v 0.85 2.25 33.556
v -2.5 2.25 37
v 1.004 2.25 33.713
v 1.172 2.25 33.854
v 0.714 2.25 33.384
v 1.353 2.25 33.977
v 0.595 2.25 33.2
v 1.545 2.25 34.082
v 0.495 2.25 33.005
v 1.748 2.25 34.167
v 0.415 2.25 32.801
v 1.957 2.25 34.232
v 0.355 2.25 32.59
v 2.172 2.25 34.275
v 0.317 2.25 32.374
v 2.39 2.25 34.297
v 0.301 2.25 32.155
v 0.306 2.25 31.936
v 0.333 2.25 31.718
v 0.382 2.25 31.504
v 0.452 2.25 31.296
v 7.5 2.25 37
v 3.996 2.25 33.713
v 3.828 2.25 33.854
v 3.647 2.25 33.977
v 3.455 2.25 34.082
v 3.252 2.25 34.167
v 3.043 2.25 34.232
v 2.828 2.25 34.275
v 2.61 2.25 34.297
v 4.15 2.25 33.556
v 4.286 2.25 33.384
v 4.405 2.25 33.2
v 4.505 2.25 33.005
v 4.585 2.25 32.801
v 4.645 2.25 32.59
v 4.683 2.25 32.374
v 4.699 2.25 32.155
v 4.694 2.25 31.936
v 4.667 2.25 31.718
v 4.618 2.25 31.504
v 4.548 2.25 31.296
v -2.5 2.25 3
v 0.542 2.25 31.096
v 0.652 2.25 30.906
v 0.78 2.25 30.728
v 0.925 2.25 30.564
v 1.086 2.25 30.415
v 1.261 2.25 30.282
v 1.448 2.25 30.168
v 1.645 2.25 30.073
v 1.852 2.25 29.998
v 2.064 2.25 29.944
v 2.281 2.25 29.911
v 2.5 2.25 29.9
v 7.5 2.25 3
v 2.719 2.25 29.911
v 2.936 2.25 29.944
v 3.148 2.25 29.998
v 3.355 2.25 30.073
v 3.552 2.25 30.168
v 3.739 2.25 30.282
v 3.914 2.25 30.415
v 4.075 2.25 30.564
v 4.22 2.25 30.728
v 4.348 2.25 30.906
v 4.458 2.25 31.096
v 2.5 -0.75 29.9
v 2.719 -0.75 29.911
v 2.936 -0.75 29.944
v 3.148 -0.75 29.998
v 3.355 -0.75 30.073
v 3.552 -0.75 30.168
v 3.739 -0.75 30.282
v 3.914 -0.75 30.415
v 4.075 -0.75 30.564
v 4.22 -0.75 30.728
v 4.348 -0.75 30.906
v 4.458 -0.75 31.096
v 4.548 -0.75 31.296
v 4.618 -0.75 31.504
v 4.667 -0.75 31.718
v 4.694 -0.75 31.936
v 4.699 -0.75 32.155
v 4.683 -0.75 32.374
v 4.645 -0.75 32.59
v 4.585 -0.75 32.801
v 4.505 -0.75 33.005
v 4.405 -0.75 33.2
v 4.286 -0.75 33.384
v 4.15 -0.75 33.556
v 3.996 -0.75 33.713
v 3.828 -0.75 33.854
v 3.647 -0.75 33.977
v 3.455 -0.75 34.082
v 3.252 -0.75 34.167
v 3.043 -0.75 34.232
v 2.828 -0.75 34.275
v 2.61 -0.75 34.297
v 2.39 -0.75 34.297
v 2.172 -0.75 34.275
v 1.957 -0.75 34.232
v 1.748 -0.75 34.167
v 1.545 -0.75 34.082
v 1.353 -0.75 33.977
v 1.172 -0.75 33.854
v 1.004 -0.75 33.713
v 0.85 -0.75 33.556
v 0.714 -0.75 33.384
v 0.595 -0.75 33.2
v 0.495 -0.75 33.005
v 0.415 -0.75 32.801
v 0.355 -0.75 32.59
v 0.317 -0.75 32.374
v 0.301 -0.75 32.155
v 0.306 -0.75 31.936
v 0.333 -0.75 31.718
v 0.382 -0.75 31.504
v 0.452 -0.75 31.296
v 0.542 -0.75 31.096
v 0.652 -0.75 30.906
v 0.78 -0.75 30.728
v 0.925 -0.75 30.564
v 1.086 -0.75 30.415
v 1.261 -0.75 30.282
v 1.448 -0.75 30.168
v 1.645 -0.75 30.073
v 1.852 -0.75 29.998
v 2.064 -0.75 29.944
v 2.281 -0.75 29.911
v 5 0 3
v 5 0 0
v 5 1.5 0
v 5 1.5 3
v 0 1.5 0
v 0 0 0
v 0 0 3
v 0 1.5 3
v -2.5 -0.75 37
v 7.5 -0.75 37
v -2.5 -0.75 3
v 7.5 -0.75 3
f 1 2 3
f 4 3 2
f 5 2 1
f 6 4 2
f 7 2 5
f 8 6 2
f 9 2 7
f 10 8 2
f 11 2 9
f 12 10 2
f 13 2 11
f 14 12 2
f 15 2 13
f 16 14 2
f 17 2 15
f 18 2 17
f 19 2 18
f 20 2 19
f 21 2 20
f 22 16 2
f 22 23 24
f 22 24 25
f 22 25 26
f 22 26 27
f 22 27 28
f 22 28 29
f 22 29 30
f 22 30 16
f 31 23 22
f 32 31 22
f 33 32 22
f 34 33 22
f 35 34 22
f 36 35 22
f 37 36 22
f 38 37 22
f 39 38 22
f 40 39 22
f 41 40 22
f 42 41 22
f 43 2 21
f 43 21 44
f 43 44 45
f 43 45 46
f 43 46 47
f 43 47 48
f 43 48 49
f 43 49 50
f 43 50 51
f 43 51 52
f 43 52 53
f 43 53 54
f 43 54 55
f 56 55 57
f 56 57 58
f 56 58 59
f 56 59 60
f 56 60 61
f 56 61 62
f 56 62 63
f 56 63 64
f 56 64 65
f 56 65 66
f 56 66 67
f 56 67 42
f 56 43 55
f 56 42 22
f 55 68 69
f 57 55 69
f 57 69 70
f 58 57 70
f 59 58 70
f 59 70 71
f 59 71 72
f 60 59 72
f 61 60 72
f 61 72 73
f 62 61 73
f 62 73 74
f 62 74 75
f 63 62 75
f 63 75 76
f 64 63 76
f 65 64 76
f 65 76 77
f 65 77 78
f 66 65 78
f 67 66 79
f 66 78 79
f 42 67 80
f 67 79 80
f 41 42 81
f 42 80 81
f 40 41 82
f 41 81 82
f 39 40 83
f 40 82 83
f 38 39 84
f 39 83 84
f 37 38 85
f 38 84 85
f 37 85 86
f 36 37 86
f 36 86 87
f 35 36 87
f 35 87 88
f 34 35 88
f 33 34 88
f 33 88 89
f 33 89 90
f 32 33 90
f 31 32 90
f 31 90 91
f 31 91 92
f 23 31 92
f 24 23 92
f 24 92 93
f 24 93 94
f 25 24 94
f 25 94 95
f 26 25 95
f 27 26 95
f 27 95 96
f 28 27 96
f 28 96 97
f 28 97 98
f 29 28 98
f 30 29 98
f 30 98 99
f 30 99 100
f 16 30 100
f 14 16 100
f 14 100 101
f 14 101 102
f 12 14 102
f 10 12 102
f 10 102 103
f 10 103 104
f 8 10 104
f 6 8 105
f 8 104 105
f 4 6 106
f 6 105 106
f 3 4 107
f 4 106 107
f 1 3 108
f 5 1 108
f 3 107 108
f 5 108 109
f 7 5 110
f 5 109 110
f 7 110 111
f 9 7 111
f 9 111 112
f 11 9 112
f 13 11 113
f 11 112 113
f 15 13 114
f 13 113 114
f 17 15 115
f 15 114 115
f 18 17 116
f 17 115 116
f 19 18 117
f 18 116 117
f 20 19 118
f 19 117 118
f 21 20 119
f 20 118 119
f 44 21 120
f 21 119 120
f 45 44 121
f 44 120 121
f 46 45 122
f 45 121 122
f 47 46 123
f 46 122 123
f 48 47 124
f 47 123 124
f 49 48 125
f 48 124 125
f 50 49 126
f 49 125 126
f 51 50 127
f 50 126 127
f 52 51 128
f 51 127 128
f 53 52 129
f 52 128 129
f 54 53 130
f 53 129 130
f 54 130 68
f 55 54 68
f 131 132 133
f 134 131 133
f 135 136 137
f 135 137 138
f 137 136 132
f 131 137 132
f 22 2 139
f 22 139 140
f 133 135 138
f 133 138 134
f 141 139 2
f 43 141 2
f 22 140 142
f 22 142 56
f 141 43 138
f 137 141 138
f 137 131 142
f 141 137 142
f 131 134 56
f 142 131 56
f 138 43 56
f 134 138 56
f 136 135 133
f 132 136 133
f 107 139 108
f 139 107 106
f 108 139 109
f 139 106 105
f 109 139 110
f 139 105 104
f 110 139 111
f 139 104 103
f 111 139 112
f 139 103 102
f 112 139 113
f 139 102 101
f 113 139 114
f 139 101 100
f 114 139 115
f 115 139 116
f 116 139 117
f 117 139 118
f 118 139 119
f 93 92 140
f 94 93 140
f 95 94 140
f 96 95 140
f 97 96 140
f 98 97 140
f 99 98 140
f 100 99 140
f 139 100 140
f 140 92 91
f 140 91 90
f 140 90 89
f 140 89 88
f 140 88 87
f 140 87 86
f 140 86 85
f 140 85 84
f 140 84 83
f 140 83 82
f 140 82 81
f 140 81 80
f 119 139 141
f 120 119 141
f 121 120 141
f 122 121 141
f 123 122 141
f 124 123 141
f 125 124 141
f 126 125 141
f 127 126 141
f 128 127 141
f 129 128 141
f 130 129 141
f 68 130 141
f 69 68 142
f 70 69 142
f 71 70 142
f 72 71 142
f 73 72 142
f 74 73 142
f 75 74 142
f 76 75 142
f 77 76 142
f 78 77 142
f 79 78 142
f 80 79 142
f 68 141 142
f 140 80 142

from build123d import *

# Parameters (mm, degrees)
SKETCH1_W           = 5
SKETCH1_H           = 1.5
BOSS_EXTRUDE1_DEPTH = 3
SKETCH2_W           = 10
SKETCH2_H           = 3
BOSS_EXTRUDE2_DEPTH = 34
SKETCH3_R           = 2.2
CUT_EXTRUDE1_DEPTH  = 38.871493237


with BuildPart() as part:
    # Sketch1 → Boss-Extrude1 (new body)
    with BuildSketch(Plane.XY):
        with Locations((2.5, 0.75)):
            Rectangle(SKETCH1_W, SKETCH1_H)
    extrude(amount=BOSS_EXTRUDE1_DEPTH)

    # Sketch2 → Boss-Extrude2 (add)
    with BuildSketch(Plane.XY.offset(3)):
        with Locations((2.5, 0.75)):
            Rectangle(SKETCH2_W, SKETCH2_H)
    extrude(amount=BOSS_EXTRUDE2_DEPTH)

    # Sketch3 → Cut-Extrude1 (cut, through all)
    with BuildSketch(Plane.XZ.offset(0.75)):
        with Locations(Location((2.5, 32.1, 0), (0, 0, 270))):
            Circle(SKETCH3_R)
    extrude(amount=-CUT_EXTRUDE1_DEPTH, mode=Mode.SUBTRACT)


solid = part.part
